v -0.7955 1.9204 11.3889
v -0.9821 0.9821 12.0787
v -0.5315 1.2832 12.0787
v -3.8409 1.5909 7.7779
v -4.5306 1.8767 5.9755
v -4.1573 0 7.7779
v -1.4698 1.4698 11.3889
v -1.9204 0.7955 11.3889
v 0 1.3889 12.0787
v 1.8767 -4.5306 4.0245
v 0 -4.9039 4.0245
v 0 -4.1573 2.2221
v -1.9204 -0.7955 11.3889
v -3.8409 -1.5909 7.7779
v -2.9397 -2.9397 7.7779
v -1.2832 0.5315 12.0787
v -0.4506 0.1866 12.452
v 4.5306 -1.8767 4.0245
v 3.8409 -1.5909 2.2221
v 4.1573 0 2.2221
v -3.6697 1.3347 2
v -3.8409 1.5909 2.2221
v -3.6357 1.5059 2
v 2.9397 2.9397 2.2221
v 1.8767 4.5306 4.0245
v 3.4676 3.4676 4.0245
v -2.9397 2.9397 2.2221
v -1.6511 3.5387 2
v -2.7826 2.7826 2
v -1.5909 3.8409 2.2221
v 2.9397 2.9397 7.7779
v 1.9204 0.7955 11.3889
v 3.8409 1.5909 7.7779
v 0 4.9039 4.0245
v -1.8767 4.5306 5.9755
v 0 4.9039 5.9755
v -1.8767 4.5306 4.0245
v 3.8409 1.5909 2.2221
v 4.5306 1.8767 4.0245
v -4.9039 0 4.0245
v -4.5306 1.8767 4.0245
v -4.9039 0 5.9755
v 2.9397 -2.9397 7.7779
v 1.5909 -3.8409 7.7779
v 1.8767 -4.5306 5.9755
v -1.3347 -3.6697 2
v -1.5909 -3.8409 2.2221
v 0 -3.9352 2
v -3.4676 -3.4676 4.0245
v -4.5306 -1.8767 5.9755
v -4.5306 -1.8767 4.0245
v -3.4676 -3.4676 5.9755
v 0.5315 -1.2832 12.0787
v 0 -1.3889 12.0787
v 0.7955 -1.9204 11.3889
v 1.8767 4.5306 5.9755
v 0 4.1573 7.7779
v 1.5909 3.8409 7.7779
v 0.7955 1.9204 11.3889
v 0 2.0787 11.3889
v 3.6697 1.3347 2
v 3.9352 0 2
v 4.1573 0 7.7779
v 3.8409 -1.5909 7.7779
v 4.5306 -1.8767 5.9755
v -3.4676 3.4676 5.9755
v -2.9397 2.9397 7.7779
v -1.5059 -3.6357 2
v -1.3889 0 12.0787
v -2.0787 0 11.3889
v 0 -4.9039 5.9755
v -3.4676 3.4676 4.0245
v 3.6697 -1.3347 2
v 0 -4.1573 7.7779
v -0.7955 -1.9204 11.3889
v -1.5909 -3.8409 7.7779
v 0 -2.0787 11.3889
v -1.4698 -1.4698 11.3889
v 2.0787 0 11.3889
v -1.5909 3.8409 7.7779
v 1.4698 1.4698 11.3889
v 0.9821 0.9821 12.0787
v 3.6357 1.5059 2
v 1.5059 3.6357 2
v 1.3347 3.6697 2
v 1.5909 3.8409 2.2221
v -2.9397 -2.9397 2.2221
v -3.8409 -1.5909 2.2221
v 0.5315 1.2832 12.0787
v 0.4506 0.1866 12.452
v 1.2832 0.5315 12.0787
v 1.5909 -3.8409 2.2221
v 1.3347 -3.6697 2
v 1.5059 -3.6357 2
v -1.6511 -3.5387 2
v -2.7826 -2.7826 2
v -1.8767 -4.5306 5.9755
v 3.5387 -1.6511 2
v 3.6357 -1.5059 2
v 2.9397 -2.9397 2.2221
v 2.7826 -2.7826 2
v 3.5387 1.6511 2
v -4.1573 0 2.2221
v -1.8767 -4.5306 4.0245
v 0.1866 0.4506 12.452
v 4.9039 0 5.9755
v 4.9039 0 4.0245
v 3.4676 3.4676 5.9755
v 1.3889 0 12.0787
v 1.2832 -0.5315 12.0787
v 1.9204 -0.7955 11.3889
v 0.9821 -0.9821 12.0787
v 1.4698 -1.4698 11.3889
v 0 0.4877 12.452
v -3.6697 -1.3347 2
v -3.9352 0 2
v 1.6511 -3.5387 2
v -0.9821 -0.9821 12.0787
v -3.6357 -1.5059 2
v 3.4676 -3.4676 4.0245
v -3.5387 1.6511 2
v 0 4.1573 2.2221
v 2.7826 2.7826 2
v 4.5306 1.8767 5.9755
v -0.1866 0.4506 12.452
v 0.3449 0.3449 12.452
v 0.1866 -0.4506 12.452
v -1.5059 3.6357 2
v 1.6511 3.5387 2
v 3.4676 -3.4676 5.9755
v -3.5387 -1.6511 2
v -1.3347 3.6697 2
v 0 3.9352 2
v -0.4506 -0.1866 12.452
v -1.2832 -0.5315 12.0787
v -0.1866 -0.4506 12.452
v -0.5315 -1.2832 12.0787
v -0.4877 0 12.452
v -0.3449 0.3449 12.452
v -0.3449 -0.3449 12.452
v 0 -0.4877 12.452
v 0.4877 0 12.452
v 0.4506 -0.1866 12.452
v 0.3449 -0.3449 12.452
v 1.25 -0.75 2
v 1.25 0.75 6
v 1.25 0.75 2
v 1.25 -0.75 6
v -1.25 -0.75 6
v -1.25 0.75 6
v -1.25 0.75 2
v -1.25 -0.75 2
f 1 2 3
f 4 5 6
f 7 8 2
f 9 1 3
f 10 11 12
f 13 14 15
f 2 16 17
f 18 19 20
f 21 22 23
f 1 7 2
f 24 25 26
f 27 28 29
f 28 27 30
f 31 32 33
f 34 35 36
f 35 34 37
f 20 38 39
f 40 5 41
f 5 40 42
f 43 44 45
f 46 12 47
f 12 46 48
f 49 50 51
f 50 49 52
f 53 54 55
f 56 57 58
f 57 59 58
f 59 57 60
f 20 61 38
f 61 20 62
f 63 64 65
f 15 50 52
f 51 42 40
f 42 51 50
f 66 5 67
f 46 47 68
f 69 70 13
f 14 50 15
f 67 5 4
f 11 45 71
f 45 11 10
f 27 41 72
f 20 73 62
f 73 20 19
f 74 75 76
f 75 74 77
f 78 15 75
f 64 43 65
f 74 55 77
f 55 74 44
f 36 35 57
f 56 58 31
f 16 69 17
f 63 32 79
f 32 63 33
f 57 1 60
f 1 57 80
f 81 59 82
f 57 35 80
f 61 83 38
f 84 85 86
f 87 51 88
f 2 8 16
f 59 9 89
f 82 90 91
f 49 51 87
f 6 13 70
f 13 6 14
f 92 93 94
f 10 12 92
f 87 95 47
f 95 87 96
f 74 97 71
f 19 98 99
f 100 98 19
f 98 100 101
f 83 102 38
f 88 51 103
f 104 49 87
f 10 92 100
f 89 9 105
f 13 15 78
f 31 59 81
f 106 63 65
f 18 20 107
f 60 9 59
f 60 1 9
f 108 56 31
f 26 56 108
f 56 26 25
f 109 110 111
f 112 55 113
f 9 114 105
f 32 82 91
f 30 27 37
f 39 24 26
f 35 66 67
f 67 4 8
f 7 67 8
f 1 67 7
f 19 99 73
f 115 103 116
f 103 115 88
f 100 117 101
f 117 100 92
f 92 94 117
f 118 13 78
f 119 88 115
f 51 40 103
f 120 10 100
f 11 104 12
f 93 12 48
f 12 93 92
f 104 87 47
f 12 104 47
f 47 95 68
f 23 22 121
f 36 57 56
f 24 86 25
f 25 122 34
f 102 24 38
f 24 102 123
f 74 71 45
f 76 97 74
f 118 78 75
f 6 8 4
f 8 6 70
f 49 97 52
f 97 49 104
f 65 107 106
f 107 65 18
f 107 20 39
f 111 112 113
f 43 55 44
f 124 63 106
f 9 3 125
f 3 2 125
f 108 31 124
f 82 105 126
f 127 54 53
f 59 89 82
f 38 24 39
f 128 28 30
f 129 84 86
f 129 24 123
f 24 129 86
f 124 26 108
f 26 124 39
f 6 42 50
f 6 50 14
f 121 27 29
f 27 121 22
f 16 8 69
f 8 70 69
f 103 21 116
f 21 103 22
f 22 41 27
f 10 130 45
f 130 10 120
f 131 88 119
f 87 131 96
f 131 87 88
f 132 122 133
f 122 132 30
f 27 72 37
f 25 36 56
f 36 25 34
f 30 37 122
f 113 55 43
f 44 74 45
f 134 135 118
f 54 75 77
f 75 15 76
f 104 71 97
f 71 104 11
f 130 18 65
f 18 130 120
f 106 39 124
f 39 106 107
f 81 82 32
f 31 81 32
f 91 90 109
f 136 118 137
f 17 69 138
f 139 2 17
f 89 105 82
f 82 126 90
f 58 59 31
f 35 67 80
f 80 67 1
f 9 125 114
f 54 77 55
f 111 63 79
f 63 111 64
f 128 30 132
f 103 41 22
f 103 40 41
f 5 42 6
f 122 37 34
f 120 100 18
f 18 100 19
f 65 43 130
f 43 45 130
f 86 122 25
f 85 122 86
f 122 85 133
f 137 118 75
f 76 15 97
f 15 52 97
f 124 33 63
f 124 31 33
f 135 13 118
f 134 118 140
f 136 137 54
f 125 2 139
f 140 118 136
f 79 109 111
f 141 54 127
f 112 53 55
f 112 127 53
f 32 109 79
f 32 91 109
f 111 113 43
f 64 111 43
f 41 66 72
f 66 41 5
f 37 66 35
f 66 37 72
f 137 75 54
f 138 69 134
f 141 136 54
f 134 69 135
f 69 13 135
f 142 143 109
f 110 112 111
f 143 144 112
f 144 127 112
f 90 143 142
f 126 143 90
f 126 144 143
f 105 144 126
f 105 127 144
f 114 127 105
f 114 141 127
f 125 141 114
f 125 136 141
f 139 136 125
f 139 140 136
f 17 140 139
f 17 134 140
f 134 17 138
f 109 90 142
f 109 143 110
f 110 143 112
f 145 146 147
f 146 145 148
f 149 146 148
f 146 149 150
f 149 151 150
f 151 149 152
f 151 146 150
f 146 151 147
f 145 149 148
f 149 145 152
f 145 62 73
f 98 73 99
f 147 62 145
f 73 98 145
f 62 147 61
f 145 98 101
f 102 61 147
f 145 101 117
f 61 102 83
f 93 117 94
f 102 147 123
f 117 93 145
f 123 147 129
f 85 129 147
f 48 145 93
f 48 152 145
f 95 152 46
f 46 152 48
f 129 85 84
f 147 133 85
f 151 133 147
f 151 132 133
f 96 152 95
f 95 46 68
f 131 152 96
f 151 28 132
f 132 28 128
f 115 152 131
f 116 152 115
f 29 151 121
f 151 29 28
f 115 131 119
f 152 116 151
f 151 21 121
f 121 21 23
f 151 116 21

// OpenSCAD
d1=5;
d2=10;

$fn=16;

difference() {
  hull() {
    translate([0, 0, d1]) {
      sphere(d=d2);
    }
    translate([0, 0, d2]) {
      sphere(d=d1);
    }
  }
  cube(size=[2.5, 1.5, 12], center=true);
  cube(size=[d2,d2,4], center=true);
}
